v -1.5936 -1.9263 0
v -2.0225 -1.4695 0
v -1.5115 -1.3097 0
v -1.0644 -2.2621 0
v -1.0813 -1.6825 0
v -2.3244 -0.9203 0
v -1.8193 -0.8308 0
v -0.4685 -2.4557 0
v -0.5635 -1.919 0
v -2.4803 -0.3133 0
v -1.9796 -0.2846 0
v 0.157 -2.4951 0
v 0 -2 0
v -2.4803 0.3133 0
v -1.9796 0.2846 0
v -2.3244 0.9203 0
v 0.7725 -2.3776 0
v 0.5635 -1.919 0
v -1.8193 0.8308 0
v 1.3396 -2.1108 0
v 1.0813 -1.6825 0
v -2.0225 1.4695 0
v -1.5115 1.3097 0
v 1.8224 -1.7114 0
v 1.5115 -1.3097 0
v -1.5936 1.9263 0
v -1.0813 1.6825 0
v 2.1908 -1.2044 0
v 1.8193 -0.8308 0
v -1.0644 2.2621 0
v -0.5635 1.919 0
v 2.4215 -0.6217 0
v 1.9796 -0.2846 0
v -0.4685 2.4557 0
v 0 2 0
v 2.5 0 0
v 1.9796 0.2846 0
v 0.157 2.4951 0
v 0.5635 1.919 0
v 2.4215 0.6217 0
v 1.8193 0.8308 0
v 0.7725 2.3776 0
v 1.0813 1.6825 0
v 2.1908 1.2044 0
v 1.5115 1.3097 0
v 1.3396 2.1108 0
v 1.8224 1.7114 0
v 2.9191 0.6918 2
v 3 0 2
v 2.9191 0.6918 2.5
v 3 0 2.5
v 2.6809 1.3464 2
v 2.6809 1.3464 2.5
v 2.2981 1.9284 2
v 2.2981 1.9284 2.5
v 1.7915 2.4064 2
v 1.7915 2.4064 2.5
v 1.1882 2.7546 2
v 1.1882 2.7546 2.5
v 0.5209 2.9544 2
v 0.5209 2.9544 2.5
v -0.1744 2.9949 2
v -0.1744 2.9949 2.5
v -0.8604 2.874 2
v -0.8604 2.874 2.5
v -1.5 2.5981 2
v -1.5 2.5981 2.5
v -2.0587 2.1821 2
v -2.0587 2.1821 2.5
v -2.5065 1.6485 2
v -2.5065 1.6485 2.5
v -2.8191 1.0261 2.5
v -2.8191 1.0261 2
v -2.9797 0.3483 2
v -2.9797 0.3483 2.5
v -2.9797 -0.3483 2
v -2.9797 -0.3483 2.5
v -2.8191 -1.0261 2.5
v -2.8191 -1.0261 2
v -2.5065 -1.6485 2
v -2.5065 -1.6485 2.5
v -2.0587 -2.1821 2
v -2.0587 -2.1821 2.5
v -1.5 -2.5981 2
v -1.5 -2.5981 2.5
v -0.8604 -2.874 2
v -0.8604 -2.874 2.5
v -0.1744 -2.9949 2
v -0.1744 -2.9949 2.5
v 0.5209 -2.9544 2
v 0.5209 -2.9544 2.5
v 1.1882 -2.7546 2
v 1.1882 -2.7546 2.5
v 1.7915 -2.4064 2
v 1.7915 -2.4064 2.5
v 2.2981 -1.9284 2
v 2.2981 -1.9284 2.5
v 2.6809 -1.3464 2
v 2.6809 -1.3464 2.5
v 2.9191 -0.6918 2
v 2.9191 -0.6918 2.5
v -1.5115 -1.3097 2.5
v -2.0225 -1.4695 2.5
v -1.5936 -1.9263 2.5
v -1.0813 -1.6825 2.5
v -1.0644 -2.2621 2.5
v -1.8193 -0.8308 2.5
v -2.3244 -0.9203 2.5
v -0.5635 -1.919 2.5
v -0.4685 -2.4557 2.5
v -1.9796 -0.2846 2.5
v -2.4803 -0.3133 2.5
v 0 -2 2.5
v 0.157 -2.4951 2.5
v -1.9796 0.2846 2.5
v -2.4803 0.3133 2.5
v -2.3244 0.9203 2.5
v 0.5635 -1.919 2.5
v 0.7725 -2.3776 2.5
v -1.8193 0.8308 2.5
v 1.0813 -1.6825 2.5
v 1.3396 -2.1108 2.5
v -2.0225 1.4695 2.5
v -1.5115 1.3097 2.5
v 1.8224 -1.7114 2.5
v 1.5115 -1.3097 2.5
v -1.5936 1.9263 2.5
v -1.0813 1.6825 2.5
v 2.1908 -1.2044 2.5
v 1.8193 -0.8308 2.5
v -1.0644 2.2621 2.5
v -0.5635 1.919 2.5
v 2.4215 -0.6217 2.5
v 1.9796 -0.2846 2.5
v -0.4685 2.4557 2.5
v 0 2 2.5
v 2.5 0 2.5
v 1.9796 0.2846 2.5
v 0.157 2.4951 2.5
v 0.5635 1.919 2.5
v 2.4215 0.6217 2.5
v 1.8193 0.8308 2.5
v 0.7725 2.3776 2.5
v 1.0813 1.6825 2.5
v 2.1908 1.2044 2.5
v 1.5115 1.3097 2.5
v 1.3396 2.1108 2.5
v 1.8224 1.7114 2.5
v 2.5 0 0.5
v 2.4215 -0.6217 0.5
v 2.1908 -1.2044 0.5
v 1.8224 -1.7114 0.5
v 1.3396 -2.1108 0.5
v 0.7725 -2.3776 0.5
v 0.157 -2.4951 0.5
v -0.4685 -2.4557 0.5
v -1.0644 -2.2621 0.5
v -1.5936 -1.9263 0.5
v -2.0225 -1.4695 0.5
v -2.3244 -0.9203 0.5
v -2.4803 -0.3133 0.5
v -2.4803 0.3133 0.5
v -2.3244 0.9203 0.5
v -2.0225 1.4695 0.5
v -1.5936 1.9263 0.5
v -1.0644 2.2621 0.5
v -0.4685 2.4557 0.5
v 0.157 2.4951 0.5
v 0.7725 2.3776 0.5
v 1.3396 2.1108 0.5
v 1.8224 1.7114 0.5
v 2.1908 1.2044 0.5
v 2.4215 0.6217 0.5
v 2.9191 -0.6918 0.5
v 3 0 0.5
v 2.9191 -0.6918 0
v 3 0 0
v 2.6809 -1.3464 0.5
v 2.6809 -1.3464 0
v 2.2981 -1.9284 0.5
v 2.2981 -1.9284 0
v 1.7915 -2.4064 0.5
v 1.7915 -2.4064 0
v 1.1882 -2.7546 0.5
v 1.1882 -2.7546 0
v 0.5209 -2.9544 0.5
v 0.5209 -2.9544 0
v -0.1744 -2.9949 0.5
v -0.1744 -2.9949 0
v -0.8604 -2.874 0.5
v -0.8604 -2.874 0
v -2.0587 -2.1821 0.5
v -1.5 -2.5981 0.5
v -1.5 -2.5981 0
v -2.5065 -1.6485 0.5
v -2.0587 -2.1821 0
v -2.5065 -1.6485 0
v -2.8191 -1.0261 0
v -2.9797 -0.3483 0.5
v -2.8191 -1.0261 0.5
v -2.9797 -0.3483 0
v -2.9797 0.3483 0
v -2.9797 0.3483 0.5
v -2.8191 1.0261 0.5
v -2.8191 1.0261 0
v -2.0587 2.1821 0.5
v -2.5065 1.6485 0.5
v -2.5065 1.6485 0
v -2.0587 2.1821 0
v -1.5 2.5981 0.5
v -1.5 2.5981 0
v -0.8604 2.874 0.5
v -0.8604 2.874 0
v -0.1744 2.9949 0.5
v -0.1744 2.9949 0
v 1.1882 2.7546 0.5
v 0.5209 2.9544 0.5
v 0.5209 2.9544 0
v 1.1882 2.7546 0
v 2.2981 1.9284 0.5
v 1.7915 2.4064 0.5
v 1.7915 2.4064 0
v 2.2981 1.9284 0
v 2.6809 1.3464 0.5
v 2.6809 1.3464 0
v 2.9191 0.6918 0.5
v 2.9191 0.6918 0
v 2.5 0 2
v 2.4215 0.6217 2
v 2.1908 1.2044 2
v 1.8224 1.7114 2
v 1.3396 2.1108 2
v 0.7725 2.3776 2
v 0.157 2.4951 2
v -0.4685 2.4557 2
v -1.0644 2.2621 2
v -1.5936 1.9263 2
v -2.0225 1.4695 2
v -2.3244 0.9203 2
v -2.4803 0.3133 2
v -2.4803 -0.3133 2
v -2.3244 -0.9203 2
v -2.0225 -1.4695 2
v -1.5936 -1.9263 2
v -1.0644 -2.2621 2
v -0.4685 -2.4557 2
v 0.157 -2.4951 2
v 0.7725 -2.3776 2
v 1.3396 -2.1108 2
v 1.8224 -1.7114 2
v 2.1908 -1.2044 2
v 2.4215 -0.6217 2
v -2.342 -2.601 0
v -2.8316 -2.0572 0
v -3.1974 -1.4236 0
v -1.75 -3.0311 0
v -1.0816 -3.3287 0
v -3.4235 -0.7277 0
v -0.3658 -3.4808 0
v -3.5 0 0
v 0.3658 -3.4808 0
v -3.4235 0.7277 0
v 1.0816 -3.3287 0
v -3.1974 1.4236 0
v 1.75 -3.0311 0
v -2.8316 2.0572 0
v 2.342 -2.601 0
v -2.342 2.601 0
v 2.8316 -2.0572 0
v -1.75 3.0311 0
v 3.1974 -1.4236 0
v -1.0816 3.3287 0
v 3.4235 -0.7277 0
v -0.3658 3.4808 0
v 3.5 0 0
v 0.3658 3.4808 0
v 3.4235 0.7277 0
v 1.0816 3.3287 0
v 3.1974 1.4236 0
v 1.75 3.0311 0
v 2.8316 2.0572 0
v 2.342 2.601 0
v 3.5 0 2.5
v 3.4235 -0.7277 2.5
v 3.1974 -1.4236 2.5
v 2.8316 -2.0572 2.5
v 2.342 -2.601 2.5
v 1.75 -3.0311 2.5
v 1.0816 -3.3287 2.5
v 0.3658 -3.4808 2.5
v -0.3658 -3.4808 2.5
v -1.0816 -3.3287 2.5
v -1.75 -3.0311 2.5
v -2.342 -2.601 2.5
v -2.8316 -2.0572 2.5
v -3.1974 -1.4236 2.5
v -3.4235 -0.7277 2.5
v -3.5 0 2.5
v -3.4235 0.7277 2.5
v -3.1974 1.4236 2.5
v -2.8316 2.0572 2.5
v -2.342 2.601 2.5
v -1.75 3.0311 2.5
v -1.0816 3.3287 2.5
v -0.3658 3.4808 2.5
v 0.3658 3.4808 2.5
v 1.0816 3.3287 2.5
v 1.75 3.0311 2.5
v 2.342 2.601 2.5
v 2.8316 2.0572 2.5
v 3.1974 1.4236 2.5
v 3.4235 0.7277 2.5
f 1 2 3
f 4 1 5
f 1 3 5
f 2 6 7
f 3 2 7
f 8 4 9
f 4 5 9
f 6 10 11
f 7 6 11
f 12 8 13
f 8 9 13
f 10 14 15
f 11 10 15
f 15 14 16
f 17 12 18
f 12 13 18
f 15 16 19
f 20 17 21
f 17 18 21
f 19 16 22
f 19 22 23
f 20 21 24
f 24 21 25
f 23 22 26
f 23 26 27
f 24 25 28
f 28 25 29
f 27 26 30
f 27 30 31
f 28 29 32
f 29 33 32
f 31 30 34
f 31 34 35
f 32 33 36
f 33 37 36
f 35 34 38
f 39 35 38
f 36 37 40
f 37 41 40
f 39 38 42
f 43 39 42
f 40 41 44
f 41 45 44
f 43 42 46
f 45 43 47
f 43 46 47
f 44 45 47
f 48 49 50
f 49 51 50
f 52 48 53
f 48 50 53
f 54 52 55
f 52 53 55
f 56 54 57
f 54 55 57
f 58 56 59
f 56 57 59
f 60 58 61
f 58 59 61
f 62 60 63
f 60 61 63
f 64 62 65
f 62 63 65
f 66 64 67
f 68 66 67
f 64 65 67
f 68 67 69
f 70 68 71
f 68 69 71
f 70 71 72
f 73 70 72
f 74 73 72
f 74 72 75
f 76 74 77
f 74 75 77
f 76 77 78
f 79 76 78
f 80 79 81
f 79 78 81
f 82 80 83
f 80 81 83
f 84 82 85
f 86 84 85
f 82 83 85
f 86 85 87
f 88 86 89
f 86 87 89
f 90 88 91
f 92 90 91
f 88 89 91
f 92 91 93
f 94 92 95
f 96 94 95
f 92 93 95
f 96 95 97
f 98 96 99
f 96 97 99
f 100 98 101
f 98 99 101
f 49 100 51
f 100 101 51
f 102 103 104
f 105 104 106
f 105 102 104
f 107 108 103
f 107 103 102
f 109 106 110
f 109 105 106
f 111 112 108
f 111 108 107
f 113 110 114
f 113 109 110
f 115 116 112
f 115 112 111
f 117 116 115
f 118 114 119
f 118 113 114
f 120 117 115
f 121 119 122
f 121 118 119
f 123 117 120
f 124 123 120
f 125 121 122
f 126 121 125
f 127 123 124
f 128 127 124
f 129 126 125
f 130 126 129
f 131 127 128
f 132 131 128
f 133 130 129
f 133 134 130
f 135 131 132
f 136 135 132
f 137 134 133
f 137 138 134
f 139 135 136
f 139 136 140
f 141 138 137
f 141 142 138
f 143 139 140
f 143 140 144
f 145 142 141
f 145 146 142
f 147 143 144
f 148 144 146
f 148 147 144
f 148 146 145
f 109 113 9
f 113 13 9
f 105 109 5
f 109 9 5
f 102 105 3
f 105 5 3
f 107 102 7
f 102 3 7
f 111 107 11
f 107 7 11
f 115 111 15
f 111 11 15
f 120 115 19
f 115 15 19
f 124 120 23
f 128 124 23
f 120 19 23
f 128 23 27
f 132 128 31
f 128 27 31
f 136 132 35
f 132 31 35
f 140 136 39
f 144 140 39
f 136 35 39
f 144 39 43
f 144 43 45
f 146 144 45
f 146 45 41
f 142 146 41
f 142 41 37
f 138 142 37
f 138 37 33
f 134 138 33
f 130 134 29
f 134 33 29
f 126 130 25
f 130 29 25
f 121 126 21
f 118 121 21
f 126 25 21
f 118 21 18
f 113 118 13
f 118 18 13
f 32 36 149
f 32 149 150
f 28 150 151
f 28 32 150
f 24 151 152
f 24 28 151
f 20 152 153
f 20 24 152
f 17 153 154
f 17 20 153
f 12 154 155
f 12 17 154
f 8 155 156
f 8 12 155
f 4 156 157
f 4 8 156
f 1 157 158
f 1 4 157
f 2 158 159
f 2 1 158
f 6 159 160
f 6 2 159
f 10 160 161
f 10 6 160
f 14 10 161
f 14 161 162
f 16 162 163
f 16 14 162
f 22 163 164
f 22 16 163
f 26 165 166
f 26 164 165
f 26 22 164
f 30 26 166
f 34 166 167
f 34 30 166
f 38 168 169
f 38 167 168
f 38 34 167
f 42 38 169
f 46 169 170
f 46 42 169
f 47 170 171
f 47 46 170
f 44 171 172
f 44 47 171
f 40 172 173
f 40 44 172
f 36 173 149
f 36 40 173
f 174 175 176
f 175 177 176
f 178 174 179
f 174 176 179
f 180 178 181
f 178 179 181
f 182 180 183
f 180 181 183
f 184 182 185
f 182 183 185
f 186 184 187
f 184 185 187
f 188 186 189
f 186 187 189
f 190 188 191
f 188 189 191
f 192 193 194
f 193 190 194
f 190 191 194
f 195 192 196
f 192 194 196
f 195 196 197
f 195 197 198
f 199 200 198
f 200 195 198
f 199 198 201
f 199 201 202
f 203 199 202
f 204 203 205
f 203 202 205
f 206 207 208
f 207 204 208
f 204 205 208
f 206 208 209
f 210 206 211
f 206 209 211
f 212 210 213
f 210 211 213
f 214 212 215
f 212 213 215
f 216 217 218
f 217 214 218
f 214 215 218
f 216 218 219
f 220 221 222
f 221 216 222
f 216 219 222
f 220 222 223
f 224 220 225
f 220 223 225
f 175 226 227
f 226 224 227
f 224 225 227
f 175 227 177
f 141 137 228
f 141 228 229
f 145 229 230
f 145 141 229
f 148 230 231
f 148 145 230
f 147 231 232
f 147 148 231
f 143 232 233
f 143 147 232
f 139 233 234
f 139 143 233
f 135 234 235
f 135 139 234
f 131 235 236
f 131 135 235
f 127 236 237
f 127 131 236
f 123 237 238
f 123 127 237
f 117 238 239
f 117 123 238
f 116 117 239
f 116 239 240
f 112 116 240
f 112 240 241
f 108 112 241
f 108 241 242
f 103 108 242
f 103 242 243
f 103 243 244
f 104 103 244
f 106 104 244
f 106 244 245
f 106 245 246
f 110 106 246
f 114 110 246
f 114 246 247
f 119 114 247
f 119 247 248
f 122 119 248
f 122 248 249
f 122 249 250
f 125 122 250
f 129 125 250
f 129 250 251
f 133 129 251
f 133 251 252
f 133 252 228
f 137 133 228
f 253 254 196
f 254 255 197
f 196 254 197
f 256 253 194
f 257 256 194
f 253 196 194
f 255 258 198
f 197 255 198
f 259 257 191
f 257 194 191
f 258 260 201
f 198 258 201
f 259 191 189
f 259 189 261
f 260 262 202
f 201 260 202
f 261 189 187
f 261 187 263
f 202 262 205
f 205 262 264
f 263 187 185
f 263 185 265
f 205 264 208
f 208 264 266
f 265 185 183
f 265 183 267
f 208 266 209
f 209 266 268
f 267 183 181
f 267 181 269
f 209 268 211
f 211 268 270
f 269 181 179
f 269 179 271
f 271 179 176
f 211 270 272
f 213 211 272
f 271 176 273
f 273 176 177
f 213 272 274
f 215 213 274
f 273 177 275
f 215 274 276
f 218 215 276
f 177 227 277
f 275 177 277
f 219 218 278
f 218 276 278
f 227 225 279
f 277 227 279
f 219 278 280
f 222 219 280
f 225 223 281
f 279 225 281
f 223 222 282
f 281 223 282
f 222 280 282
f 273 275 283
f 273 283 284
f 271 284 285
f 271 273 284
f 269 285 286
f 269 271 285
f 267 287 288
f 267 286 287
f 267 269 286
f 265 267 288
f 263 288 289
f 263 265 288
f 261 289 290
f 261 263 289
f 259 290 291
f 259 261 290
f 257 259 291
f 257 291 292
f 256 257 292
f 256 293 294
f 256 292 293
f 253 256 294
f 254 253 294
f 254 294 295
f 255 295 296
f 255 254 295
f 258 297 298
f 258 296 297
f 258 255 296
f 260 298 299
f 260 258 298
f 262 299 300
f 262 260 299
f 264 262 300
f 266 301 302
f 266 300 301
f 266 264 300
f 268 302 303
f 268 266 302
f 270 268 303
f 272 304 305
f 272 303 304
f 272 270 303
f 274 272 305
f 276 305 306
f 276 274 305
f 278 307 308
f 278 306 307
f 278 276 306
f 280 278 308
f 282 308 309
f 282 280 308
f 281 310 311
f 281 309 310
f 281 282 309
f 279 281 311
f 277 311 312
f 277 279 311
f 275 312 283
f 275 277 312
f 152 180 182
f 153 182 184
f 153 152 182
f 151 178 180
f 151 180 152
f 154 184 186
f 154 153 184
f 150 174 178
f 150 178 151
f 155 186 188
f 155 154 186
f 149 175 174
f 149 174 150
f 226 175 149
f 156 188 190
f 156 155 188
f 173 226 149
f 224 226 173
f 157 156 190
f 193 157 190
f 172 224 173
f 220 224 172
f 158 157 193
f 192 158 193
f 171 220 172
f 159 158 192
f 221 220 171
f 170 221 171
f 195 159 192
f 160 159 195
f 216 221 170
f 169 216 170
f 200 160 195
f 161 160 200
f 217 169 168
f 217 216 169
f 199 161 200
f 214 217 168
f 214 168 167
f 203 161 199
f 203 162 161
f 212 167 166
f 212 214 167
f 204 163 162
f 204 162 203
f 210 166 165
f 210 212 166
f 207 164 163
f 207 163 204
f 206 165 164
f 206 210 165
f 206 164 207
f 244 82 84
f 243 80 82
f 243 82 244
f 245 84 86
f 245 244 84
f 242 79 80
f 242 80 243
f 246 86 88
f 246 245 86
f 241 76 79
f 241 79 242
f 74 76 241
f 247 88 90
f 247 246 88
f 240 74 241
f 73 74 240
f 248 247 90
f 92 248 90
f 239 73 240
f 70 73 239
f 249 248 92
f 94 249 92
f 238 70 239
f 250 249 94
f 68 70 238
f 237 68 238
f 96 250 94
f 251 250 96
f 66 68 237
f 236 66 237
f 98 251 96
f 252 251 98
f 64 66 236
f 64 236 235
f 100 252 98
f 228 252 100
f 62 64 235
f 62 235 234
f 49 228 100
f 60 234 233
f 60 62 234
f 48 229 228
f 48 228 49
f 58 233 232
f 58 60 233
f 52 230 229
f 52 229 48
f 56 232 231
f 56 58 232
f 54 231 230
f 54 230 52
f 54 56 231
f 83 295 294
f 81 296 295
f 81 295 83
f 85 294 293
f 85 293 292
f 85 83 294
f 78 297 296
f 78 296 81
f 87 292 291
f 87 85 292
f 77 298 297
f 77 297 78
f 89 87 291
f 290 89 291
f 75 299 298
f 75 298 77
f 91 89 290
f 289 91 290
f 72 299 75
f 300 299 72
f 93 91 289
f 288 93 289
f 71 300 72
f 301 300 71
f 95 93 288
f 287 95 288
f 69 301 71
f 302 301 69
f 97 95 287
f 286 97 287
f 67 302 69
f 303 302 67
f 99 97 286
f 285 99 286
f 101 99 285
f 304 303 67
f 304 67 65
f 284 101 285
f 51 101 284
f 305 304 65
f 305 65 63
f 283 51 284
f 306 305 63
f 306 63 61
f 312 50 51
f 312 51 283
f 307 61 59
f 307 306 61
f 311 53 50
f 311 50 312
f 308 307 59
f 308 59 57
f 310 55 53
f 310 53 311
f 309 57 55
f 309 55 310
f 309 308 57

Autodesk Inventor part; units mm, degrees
ref_plane "YZ Plane" through (0, 0, 0) normal (1, 0, 0) x (0, 1, 0)
ref_plane "XZ Plane" through (0, 0, 0) normal (0, 1, 0) x (-1, 0, 0)
sketch "Sketch1" plane through (0, 0, 0) normal (0, 0, 1) x (1, 0, 0)
  circle A0 centre (0, 0) radius 3.5
  dimension "d0" = 7
extrude "Extrusion1" add sketch "Sketch1" along normal blind 2.5
hole "Hole1" at (0, 0, 2.5) direction (0, 0, -1) diameter 4 end through all
sketch "Sketch2" plane through (0, 0, 2.5) normal (0, 0, 1) x (1, 0, 0)
  circle A0 centre (0, 0) radius 3
  circle A1 centre (0, 0) radius 2.5
  dimension "d12" = 6
  dimension "d13" = 5
extrude "Extrusion2" cut sketch "Sketch2" against normal blind 0.5
ref_plane "Work Plane1" through (0, 0, 1.25) normal (0, 0, 1) x (1, 0, 0)
mirror "Mirror1" about plane through (0, 0, 1.25) normal (0, 0, 1) of "Extrusion2"
properties part number "bearing_4x7x2.5_74" material "Stainless Steel"
